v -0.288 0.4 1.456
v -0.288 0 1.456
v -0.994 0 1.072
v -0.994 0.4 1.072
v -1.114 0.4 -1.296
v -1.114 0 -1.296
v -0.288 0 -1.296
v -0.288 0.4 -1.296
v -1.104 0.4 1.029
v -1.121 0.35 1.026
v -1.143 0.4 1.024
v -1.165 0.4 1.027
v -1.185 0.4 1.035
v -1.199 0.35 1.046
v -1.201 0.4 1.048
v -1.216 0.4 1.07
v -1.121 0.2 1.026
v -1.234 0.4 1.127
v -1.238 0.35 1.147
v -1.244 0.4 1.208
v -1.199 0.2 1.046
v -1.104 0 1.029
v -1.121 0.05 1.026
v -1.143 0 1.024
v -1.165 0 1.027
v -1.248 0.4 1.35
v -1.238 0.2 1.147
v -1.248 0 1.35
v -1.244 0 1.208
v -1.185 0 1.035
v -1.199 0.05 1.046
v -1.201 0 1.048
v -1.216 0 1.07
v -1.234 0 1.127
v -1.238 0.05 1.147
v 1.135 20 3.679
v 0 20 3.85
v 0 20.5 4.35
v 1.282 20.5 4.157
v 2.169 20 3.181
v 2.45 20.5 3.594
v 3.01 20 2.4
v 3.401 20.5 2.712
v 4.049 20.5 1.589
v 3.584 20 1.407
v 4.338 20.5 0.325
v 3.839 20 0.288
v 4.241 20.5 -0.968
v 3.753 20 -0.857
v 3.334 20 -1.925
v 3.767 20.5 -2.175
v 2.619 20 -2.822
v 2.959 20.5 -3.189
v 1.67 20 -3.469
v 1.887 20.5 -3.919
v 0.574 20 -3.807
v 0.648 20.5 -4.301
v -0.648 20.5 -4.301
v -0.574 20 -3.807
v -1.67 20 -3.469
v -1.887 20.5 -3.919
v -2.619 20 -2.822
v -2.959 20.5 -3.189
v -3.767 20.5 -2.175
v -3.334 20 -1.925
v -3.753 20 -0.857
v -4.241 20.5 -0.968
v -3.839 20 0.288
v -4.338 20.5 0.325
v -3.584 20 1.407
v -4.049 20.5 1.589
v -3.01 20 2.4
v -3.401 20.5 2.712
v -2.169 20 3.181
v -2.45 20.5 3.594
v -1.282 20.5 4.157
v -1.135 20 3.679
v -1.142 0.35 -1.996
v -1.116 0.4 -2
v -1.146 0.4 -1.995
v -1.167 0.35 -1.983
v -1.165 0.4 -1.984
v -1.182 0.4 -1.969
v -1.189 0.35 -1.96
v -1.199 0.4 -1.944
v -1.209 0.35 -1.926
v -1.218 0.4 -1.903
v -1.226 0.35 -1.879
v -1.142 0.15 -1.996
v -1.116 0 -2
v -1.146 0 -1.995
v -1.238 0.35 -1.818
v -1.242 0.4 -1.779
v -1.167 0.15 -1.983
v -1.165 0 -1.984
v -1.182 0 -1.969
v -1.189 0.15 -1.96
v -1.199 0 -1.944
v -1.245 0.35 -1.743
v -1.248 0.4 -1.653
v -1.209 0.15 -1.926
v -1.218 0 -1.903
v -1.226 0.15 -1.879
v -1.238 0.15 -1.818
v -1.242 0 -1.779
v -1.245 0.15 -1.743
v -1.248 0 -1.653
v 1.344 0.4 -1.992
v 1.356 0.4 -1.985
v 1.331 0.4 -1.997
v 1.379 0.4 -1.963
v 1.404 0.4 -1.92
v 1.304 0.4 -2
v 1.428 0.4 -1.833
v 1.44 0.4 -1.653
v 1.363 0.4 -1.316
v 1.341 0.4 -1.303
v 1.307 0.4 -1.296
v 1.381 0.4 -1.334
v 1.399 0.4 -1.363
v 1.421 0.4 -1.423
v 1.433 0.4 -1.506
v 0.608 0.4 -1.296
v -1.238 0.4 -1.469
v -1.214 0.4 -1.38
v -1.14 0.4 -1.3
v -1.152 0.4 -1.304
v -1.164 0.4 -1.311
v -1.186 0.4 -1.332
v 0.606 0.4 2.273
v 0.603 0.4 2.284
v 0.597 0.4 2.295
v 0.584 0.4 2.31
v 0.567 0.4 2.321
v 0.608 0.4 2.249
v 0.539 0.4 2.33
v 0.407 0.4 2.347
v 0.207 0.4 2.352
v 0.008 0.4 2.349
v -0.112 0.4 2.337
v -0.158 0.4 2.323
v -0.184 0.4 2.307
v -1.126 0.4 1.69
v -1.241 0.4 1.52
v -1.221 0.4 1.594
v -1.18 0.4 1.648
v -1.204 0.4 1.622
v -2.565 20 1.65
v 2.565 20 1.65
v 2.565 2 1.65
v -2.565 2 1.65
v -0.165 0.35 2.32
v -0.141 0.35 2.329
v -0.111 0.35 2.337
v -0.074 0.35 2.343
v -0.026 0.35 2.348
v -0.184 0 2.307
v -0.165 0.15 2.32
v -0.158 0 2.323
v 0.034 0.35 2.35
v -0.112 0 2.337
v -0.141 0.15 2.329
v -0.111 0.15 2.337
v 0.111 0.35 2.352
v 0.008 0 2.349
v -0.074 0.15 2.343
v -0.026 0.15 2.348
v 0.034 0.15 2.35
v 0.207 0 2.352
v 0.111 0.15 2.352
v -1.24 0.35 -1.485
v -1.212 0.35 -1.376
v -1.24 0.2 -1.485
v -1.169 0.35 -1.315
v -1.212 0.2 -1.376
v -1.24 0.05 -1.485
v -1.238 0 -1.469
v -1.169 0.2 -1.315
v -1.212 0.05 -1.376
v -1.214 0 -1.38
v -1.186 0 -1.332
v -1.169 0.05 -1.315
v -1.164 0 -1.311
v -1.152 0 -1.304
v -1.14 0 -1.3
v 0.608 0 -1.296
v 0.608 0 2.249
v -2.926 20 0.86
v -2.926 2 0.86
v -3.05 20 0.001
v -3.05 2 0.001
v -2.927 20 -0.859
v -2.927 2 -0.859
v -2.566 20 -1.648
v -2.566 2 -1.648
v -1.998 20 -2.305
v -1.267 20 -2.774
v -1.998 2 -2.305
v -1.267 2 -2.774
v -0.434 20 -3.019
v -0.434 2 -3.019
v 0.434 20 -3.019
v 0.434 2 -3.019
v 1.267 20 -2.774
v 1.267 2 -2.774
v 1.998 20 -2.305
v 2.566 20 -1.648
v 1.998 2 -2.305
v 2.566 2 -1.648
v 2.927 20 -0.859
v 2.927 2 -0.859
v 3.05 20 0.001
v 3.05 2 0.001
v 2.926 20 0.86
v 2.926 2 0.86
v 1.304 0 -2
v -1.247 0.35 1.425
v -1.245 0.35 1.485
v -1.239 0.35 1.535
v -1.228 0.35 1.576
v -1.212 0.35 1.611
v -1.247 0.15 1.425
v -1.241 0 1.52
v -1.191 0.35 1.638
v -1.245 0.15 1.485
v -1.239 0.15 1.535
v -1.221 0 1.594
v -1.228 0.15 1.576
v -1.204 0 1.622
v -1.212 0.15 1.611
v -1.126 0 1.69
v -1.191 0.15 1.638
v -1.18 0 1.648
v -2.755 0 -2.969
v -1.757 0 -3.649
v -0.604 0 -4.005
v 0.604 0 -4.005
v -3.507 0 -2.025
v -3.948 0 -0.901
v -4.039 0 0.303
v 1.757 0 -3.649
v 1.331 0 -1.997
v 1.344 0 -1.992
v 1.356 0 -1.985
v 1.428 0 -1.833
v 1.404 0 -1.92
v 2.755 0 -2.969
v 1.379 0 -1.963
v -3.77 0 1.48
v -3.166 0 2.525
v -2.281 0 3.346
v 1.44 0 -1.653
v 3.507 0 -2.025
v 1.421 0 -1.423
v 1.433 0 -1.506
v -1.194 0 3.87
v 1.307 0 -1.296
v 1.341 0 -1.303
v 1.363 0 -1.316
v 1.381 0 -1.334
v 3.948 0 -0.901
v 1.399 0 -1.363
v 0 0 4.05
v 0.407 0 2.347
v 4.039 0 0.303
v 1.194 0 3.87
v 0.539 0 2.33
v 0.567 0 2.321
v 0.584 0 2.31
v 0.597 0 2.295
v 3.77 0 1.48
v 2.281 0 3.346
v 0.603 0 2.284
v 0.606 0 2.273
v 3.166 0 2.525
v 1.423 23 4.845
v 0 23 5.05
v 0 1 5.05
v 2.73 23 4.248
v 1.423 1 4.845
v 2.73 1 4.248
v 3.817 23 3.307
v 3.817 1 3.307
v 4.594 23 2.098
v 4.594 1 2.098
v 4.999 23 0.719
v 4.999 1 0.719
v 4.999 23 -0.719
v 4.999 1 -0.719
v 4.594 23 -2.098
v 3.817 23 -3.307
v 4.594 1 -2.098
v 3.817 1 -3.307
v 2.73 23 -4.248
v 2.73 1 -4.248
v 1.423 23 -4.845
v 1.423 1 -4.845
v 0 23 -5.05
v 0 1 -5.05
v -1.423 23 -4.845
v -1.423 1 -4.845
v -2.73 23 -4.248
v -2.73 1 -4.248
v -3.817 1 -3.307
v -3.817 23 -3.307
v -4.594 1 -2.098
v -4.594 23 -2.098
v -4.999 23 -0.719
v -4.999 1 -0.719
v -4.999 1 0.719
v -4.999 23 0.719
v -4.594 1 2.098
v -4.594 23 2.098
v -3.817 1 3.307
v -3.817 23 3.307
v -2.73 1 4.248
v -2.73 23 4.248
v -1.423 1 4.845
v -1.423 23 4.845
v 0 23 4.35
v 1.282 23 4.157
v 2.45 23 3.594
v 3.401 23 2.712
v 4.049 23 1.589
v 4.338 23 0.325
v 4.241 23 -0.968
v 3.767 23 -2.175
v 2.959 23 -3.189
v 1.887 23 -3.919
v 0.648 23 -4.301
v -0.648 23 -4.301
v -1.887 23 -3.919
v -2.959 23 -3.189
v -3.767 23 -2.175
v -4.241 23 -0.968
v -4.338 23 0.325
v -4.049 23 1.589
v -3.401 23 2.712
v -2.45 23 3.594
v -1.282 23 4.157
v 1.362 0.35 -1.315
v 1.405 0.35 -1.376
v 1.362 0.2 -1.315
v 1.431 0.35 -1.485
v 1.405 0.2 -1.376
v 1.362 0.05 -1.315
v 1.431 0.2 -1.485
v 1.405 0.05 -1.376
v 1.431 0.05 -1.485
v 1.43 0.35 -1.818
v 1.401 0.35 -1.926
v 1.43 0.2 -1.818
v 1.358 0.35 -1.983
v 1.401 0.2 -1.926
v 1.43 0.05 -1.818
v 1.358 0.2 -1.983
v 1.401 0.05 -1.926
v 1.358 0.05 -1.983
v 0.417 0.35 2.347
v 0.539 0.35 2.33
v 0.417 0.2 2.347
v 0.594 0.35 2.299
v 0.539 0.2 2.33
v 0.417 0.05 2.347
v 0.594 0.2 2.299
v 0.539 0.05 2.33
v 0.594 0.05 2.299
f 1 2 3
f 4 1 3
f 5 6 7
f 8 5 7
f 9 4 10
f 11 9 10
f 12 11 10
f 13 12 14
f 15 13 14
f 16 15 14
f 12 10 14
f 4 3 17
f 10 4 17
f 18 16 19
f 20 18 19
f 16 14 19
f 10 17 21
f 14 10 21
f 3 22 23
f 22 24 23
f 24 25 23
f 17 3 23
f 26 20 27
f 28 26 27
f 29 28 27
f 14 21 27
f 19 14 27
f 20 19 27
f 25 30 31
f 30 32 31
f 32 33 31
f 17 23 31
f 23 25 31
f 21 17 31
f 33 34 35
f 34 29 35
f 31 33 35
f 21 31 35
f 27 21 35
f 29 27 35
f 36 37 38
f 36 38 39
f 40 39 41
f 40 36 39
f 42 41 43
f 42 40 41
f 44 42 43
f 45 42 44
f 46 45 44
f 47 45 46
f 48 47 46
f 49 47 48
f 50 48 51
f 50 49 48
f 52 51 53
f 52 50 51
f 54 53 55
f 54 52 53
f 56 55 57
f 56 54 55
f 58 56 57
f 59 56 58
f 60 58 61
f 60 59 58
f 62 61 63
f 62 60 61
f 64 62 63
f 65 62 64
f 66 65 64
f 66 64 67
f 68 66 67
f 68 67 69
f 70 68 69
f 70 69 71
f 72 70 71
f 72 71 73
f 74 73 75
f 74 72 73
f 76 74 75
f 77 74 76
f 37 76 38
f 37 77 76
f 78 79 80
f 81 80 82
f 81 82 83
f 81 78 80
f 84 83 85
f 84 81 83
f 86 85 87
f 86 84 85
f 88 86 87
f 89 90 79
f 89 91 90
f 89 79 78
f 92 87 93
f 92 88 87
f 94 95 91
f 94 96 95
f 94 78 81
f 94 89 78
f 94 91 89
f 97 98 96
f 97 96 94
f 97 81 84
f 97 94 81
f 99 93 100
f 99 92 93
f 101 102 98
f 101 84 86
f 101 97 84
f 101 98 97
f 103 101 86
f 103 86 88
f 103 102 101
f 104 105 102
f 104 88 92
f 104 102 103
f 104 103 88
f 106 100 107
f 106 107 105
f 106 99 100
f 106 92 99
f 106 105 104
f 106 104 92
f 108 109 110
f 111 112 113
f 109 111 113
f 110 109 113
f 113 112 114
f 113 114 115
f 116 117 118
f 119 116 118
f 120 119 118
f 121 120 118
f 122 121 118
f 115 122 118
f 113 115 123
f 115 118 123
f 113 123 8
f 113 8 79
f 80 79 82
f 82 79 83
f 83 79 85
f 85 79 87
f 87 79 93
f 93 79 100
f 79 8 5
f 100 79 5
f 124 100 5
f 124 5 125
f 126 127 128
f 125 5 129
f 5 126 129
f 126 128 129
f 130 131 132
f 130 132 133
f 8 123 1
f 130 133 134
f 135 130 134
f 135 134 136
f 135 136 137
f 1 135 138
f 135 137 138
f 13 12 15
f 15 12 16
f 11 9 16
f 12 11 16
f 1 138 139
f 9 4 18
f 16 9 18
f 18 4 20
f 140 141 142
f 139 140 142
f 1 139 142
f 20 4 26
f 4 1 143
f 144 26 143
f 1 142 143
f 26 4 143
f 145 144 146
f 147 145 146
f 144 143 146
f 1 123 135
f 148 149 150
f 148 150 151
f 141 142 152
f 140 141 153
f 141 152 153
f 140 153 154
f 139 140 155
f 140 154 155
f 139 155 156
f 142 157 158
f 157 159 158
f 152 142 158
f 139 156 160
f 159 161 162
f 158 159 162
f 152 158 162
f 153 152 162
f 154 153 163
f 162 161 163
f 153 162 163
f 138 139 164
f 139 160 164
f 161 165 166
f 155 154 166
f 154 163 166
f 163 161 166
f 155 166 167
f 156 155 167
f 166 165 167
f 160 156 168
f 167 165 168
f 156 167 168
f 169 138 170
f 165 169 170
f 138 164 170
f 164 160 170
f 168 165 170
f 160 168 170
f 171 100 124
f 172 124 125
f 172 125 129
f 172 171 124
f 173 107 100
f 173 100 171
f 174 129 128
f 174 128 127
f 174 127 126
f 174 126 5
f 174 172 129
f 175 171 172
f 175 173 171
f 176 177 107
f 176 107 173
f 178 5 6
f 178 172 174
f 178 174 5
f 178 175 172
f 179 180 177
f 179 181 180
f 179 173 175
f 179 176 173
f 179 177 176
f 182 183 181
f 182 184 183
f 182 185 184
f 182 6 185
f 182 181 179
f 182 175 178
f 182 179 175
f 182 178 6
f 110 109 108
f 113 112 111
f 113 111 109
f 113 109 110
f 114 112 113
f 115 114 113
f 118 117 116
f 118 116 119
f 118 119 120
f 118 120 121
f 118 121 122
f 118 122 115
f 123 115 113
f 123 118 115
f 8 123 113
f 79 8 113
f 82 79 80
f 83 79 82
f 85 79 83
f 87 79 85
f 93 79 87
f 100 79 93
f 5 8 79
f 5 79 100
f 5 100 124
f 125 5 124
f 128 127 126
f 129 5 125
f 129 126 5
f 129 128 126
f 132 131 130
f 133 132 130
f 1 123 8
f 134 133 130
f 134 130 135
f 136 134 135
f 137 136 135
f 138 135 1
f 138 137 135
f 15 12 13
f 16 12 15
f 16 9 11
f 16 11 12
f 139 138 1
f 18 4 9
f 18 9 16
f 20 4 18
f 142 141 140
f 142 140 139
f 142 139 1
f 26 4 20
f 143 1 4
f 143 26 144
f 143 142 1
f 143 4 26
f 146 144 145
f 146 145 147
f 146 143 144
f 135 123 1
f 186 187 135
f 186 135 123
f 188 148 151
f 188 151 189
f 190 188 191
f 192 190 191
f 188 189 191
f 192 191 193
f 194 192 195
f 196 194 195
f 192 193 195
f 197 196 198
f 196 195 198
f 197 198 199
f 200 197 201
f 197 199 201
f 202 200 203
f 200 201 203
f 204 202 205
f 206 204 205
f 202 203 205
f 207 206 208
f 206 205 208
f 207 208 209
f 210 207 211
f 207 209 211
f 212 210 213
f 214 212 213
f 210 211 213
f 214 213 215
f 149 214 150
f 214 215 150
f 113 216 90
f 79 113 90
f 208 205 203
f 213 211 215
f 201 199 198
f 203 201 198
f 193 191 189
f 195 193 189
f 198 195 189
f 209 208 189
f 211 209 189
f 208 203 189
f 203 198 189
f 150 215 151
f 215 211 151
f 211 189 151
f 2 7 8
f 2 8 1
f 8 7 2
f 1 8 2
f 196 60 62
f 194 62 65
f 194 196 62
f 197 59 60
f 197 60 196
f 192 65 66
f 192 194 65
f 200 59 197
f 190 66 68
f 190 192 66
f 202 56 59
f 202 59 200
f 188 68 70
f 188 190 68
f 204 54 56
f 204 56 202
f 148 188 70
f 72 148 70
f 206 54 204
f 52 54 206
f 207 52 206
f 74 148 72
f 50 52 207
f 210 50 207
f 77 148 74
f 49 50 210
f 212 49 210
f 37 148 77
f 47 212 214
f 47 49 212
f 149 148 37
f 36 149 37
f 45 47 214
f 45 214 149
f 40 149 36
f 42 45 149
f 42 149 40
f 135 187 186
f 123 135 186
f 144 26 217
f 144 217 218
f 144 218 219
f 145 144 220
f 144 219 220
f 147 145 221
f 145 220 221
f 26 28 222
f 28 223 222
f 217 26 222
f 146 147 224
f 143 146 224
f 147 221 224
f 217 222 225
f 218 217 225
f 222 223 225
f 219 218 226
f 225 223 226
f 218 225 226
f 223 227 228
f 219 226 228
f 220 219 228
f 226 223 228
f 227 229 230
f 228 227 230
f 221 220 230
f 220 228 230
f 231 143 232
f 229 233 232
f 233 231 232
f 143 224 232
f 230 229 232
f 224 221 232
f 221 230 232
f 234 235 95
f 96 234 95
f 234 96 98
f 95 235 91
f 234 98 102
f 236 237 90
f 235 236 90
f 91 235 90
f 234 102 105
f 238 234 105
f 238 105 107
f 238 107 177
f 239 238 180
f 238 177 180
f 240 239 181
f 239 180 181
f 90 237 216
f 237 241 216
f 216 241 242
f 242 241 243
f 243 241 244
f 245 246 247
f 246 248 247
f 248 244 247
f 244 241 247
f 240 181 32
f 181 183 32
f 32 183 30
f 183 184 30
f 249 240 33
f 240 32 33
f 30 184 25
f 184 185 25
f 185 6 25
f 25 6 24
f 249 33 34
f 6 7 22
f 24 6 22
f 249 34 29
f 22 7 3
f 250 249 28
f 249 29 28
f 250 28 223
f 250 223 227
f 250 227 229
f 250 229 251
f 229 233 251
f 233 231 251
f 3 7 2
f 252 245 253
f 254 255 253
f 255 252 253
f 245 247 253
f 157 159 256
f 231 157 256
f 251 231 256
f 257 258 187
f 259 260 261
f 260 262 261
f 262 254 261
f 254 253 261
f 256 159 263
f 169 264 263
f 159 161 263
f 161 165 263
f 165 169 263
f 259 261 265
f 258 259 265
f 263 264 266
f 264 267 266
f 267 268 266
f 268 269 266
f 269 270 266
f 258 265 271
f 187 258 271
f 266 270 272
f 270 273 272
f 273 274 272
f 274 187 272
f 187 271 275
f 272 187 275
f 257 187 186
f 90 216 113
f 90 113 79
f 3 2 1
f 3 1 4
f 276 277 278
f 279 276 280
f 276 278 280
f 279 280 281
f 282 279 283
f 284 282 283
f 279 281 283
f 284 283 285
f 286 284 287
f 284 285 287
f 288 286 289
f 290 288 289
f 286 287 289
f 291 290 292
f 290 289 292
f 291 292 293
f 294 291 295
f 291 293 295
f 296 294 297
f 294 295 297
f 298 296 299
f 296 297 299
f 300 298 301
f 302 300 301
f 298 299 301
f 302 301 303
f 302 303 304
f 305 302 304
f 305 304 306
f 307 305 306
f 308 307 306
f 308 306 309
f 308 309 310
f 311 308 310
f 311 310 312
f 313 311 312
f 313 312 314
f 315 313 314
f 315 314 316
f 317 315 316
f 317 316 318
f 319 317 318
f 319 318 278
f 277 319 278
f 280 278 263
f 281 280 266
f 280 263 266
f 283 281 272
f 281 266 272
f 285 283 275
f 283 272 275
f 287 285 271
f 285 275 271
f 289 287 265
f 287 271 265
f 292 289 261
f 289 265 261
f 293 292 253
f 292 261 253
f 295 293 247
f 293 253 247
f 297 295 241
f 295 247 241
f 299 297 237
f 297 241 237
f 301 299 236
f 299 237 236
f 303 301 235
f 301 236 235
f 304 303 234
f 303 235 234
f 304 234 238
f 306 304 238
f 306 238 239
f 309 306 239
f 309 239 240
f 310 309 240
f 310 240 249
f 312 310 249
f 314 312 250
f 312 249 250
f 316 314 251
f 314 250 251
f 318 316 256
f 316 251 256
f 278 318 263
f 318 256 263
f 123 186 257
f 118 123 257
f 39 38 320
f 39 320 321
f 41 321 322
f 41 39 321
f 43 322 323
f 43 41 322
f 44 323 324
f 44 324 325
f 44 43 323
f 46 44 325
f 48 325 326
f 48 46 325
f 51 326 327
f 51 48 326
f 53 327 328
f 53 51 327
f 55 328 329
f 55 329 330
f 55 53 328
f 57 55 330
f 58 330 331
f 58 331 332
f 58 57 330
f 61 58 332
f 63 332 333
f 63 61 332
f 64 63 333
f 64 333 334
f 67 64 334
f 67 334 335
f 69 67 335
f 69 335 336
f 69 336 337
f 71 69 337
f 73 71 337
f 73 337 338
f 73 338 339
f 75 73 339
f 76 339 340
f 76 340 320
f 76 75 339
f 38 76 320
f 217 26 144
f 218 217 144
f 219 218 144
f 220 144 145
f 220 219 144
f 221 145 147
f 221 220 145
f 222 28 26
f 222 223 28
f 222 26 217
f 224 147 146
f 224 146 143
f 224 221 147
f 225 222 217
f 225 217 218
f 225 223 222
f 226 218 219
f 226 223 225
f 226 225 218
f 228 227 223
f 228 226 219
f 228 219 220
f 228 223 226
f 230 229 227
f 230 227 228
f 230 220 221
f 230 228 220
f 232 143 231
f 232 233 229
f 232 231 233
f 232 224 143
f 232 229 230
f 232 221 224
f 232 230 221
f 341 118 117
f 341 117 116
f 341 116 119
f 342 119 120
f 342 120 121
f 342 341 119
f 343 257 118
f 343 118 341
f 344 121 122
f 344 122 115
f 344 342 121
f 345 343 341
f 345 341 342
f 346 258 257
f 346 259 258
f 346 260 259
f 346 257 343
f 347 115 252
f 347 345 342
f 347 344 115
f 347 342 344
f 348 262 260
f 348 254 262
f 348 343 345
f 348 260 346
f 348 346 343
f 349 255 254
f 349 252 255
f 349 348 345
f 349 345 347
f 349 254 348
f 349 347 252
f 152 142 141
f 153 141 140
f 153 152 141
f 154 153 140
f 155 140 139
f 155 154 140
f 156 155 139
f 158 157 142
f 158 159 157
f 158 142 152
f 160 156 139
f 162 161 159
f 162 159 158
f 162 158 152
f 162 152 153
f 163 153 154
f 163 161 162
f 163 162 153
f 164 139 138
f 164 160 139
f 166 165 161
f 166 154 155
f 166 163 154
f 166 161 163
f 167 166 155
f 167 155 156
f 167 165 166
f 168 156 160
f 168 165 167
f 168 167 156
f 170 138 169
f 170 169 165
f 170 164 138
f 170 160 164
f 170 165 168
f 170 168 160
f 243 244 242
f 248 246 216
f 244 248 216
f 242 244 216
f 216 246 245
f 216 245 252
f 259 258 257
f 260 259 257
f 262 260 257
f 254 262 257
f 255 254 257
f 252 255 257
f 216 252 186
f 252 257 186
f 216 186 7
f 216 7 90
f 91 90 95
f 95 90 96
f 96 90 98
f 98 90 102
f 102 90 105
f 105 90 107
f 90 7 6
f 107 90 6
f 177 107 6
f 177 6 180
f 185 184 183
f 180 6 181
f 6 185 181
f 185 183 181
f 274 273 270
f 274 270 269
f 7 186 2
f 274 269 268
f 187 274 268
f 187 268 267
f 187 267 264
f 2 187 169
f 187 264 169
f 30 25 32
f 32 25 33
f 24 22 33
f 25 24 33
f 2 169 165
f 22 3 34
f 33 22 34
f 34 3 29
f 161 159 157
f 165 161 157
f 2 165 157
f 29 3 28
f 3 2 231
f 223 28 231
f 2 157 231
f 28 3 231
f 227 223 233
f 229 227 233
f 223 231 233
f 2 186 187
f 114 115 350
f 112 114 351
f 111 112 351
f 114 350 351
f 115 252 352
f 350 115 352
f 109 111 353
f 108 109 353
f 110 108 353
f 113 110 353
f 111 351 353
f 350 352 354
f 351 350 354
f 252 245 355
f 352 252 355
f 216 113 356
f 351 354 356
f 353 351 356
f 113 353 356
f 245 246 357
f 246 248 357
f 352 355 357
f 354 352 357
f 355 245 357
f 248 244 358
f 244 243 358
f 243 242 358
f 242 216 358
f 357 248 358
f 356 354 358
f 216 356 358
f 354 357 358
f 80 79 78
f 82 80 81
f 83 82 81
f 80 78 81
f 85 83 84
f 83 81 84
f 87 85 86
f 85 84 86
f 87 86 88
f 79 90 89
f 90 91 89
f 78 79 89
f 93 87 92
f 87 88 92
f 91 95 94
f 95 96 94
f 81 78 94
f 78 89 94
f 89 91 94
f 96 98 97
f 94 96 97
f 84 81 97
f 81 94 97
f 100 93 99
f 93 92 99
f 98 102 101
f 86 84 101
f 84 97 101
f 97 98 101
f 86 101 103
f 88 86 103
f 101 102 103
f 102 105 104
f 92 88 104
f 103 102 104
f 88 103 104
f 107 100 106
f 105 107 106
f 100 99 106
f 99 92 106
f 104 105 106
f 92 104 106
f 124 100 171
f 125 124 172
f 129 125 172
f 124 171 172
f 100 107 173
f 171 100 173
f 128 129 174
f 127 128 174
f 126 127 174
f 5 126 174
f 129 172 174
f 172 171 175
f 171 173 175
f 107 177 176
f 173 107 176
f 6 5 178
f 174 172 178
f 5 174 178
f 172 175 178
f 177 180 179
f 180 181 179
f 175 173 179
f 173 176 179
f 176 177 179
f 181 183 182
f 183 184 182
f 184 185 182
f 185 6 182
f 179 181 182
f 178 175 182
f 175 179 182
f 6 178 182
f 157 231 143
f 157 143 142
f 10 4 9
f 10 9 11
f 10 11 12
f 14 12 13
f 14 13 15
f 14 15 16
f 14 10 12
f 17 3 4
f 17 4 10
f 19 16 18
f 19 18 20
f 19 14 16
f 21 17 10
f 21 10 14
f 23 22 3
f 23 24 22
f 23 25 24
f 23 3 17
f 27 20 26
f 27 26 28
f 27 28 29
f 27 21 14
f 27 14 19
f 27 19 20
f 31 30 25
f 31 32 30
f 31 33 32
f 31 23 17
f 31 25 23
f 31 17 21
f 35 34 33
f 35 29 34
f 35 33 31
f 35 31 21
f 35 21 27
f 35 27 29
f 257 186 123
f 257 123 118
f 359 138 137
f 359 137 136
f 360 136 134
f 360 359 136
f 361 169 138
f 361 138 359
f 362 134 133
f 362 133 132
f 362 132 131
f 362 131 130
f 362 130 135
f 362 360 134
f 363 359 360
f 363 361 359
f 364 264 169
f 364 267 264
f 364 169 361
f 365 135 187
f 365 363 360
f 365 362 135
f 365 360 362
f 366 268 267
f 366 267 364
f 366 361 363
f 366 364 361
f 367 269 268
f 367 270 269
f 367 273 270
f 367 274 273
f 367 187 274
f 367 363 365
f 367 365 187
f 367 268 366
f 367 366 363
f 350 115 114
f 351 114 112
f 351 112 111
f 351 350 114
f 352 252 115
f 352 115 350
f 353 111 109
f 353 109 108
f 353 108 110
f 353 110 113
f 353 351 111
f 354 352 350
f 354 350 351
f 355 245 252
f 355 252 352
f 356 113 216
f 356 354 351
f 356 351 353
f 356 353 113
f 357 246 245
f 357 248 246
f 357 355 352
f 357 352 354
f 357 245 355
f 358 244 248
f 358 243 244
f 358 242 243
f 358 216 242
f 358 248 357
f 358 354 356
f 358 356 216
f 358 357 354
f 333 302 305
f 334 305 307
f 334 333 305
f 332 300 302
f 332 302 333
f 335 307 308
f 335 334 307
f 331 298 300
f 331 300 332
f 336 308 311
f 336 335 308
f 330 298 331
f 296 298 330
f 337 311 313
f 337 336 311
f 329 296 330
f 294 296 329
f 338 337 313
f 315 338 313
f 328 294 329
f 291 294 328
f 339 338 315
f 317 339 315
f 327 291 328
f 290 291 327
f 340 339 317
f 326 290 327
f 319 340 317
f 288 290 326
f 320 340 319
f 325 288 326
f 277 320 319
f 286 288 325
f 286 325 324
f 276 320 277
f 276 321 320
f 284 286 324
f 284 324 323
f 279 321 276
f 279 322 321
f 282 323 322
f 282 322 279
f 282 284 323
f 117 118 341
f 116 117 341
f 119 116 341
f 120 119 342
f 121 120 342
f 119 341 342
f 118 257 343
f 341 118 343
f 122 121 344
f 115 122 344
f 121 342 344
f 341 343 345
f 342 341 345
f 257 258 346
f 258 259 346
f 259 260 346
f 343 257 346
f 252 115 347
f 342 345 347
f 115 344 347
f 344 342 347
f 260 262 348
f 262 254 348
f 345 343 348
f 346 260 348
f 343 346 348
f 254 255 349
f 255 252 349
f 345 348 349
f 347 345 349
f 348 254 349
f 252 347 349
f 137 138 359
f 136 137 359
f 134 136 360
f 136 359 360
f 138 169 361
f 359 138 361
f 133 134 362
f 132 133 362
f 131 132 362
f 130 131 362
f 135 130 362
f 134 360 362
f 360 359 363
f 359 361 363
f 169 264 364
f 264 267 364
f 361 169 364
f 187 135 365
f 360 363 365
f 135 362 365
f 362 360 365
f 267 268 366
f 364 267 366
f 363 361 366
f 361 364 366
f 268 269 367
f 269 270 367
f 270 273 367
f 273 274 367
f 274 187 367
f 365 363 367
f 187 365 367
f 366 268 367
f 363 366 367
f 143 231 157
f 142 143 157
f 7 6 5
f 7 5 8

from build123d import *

# Parameters (mm, degrees)
SKETCH1_R           = 5.05
BOSS_EXTRUDE1_DEPTH = 20
SKETCH2_R           = 5.05
BOSS_EXTRUDE2_DEPTH = 2
SKETCH4_R           = 5.05
SKETCH4_R_2         = 4.35
BOSS_EXTRUDE3_DEPTH = 3
CHAMFER1_SIZE       = 1
CHAMFER2_SIZE       = 0.5
CUT_EXTRUDE1_DEPTH  = 0.4
BOSS_EXTRUDE4_DEPTH = 0.4


with BuildPart() as part:
    # Sketch1 → Boss-Extrude1 (new body)
    with BuildSketch(Plane(origin=(0, 0, 0), x_dir=(1, 0, 0), z_dir=(0, 1, 0))):
        Circle(SKETCH1_R)
        with BuildLine():
            Line((2.565151068, -1.65), (-2.565151068, -1.65))
            ThreePointArc((-2.565151068, -1.65), (0, 3.05), (2.565151068, -1.65))
        make_face(mode=Mode.SUBTRACT)
    extrude(amount=BOSS_EXTRUDE1_DEPTH)

    # Sketch2 → Boss-Extrude2 (add)
    with BuildSketch(Plane.XZ):
        Circle(SKETCH2_R)
    extrude(amount=-BOSS_EXTRUDE2_DEPTH)

    # Sketch4 → Boss-Extrude3 (add)
    with BuildSketch(Plane(origin=(0, 20, 0), x_dir=(1, 0, 0), z_dir=(0, 1, 0))):
        Circle(SKETCH4_R)
        Circle(SKETCH4_R_2, mode=Mode.SUBTRACT)
    extrude(amount=BOSS_EXTRUDE3_DEPTH)

    # Chamfer1
    chamfer1_edges = [part.edges().sort_by_distance(p)[0] for p in [
        (-5.05, 0, 0),
    ]]
    chamfer(chamfer1_edges, length=CHAMFER1_SIZE)

    # Chamfer2
    chamfer2_edges = [part.edges().sort_by_distance(p)[0] for p in [
        (-4.35, 20, 0),
    ]]
    chamfer(chamfer2_edges, length=CHAMFER2_SIZE)

    # Sketch5 → Cut-Extrude1 (cut)
    with BuildSketch(Plane.XZ):
        with BuildLine():
            add(Edge.make_bspline(
                [(1.439948587, -1.653012389), (1.439876699, -1.683045128), (1.43974458, -1.738240911), (1.431271471, -1.813705895), (1.420527775, -1.875466606), (1.403574072, -1.923288418), (1.383622282, -1.959101708), (1.360105213, -1.983267515), (1.333129744, -1.998183394), (1.313801842, -1.999386809), (1.303953443, -2)],
                knots=[0, 0, 0, 0, 1.769380938, 3.251863504, 4.473793643, 5.456147252, 6.231459106, 6.87077347, 7.424610359, 8, 8, 8, 8], degree=3))
            Line((1.303953443, -2), (-1.115960155, -2))
            add(Edge.make_bspline(
                [(-1.115960155, -2), (-1.124764856, -1.999235199), (-1.143000862, -1.997651168), (-1.169069324, -1.98355213), (-1.191525204, -1.958680582), (-1.211674261, -1.923370629), (-1.22844035, -1.875430661), (-1.2396129, -1.81377917), (-1.2461065, -1.738146636), (-1.247303601, -1.683026326), (-1.247955442, -1.653012389)],
                knots=[0, 0, 0, 0, 0.521835169, 1.080807807, 1.712179375, 2.494680724, 3.486143732, 4.719404872, 6.213660719, 8, 8, 8, 8], degree=3))
            add(Edge.make_bspline(
                [(-1.247955442, -1.653012389), (-1.247564606, -1.622348678), (-1.246849977, -1.56628126), (-1.242082904, -1.489472136), (-1.229908593, -1.427530805), (-1.214570878, -1.378346332), (-1.19448558, -1.341252685), (-1.171381331, -1.314540094), (-1.143493064, -1.299098496), (-1.123793171, -1.297048409), (-1.113960226, -1.296025135)],
                knots=[0, 0, 0, 0, 1.773338699, 3.242481697, 4.440534656, 5.415572, 6.2091949, 6.863837362, 7.432899261, 8, 8, 8, 8], degree=3))
            Line((-1.113960226, -1.296025135), (-0.287989717, -1.296025135))
            Line((-0.287989717, -1.296025135), (-0.287989717, 1.455876608))
            Line((-0.287989717, 1.455876608), (-0.993964511, 1.071890319))
            add(Edge.make_bspline(
                [(-0.993964511, 1.071890319), (-1.017440507, 1.061445685), (-1.058655219, 1.043108974), (-1.115600787, 1.024261243), (-1.164016876, 1.022727864), (-1.204048063, 1.044740206), (-1.227168973, 1.090535397), (-1.241056947, 1.154646882), (-1.245930838, 1.243521995), (-1.247219803, 1.311235138), (-1.247955442, 1.349880393)],
                knots=[0, 0, 0, 0, 1.16110972, 2.038456742, 2.701448753, 3.288176025, 3.990880841, 4.937165991, 6.251978929, 8, 8, 8, 8], degree=3))
            add(Edge.make_bspline(
                [(-1.247955442, 1.349880393), (-1.247653425, 1.374880402), (-1.247109683, 1.419889746), (-1.245945241, 1.481671813), (-1.240636397, 1.532510166), (-1.22932079, 1.574897869), (-1.214108207, 1.610487858), (-1.190963524, 1.639477582), (-1.161196377, 1.665121533), (-1.138457223, 1.681091287), (-1.125959798, 1.689868254)],
                knots=[0, 0, 0, 0, 1.56313437, 2.814225196, 3.86369772, 4.748352527, 5.550351806, 6.263187403, 7.045448883, 8, 8, 8, 8], degree=3))
            Line((-1.125959798, 1.689868254), (-0.183993431, 2.306846225))
            add(Edge.make_bspline(
                [(-0.183993431, 2.306846225), (-0.177863774, 2.311559679), (-0.16490946, 2.321521017), (-0.139222649, 2.329492175), (-0.109092066, 2.338056382), (-0.070433284, 2.34348131), (-0.022153707, 2.34904437), (0.039686671, 2.349651098), (0.117302801, 2.352623049), (0.17498744, 2.352122396), (0.206992609, 2.351844618)],
                knots=[0, 0, 0, 0, 0.462162572, 0.976726718, 1.600024173, 2.352504238, 3.321320859, 4.526493399, 6.072794308, 8, 8, 8, 8], degree=3))
            add(Edge.make_bspline(
                [(0.206992609, 2.351844618), (0.246335885, 2.351808308), (0.316381456, 2.351743662), (0.410069056, 2.347873639), (0.481820359, 2.341824657), (0.534201311, 2.331725803), (0.572123093, 2.320729809), (0.59477989, 2.300462138), (0.607217242, 2.276119035), (0.607713437, 2.258338867), (0.607978292, 2.248848296)],
                knots=[0, 0, 0, 0, 2.095956985, 3.731578029, 4.998773625, 5.921870021, 6.585026704, 7.062945429, 7.499825718, 8, 8, 8, 8], degree=3))
            Line((0.607978292, 2.248848296), (0.607978292, -1.296025135))
            Line((0.607978292, -1.296025135), (1.306953335, -1.296025135))
            add(Edge.make_bspline(
                [(1.306953335, -1.296025135), (1.316786669, -1.297048343), (1.336487341, -1.299098296), (1.364369456, -1.314540952), (1.387502528, -1.341248585), (1.407443488, -1.378367057), (1.42348129, -1.427311655), (1.431911749, -1.489804249), (1.43957322, -1.566161665), (1.43981592, -1.622316445), (1.439948587, -1.653012389)],
                knots=[0, 0, 0, 0, 0.567469369, 1.136901174, 1.79196917, 2.586107946, 3.56177909, 4.753767401, 6.225508585, 8, 8, 8, 8], degree=3))
        make_face()
    extrude(amount=-CUT_EXTRUDE1_DEPTH, mode=Mode.SUBTRACT)


with BuildPart() as body_2:
    # Sketch5<2> → Boss-Extrude4 (new body)
    with BuildSketch(Plane.XZ):
        with BuildLine():
            add(Edge.make_bspline(
                [(1.439948587, -1.653012389), (1.439876699, -1.683045128), (1.43974458, -1.738240911), (1.431271471, -1.813705895), (1.420527775, -1.875466606), (1.403574072, -1.923288418), (1.383622282, -1.959101708), (1.360105213, -1.983267515), (1.333129744, -1.998183394), (1.313801842, -1.999386809), (1.303953443, -2)],
                knots=[0, 0, 0, 0, 1.769380938, 3.251863504, 4.473793643, 5.456147252, 6.231459106, 6.87077347, 7.424610359, 8, 8, 8, 8], degree=3))
            Line((1.303953443, -2), (-1.115960155, -2))
            add(Edge.make_bspline(
                [(-1.115960155, -2), (-1.124764856, -1.999235199), (-1.143000862, -1.997651168), (-1.169069324, -1.98355213), (-1.191525204, -1.958680582), (-1.211674261, -1.923370629), (-1.22844035, -1.875430661), (-1.2396129, -1.81377917), (-1.2461065, -1.738146636), (-1.247303601, -1.683026326), (-1.247955442, -1.653012389)],
                knots=[0, 0, 0, 0, 0.521835169, 1.080807807, 1.712179375, 2.494680724, 3.486143732, 4.719404872, 6.213660719, 8, 8, 8, 8], degree=3))
            add(Edge.make_bspline(
                [(-1.247955442, -1.653012389), (-1.247564606, -1.622348678), (-1.246849977, -1.56628126), (-1.242082904, -1.489472136), (-1.229908593, -1.427530805), (-1.214570878, -1.378346332), (-1.19448558, -1.341252685), (-1.171381331, -1.314540094), (-1.143493064, -1.299098496), (-1.123793171, -1.297048409), (-1.113960226, -1.296025135)],
                knots=[0, 0, 0, 0, 1.773338699, 3.242481697, 4.440534656, 5.415572, 6.2091949, 6.863837362, 7.432899261, 8, 8, 8, 8], degree=3))
            Line((-1.113960226, -1.296025135), (-0.287989717, -1.296025135))
            Line((-0.287989717, -1.296025135), (-0.287989717, 1.455876608))
            Line((-0.287989717, 1.455876608), (-0.993964511, 1.071890319))
            add(Edge.make_bspline(
                [(-0.993964511, 1.071890319), (-1.017440507, 1.061445685), (-1.058655219, 1.043108974), (-1.115600787, 1.024261243), (-1.164016876, 1.022727864), (-1.204048063, 1.044740206), (-1.227168973, 1.090535397), (-1.241056947, 1.154646882), (-1.245930838, 1.243521995), (-1.247219803, 1.311235138), (-1.247955442, 1.349880393)],
                knots=[0, 0, 0, 0, 1.16110972, 2.038456742, 2.701448753, 3.288176025, 3.990880841, 4.937165991, 6.251978929, 8, 8, 8, 8], degree=3))
            add(Edge.make_bspline(
                [(-1.247955442, 1.349880393), (-1.247653425, 1.374880402), (-1.247109683, 1.419889746), (-1.245945241, 1.481671813), (-1.240636397, 1.532510166), (-1.22932079, 1.574897869), (-1.214108207, 1.610487858), (-1.190963524, 1.639477582), (-1.161196377, 1.665121533), (-1.138457223, 1.681091287), (-1.125959798, 1.689868254)],
                knots=[0, 0, 0, 0, 1.56313437, 2.814225196, 3.86369772, 4.748352527, 5.550351806, 6.263187403, 7.045448883, 8, 8, 8, 8], degree=3))
            Line((-1.125959798, 1.689868254), (-0.183993431, 2.306846225))
            add(Edge.make_bspline(
                [(-0.183993431, 2.306846225), (-0.177863774, 2.311559679), (-0.16490946, 2.321521017), (-0.139222649, 2.329492175), (-0.109092066, 2.338056382), (-0.070433284, 2.34348131), (-0.022153707, 2.34904437), (0.039686671, 2.349651098), (0.117302801, 2.352623049), (0.17498744, 2.352122396), (0.206992609, 2.351844618)],
                knots=[0, 0, 0, 0, 0.462162572, 0.976726718, 1.600024173, 2.352504238, 3.321320859, 4.526493399, 6.072794308, 8, 8, 8, 8], degree=3))
            add(Edge.make_bspline(
                [(0.206992609, 2.351844618), (0.246335885, 2.351808308), (0.316381456, 2.351743662), (0.410069056, 2.347873639), (0.481820359, 2.341824657), (0.534201311, 2.331725803), (0.572123093, 2.320729809), (0.59477989, 2.300462138), (0.607217242, 2.276119035), (0.607713437, 2.258338867), (0.607978292, 2.248848296)],
                knots=[0, 0, 0, 0, 2.095956985, 3.731578029, 4.998773625, 5.921870021, 6.585026704, 7.062945429, 7.499825718, 8, 8, 8, 8], degree=3))
            Line((0.607978292, 2.248848296), (0.607978292, -1.296025135))
            Line((0.607978292, -1.296025135), (1.306953335, -1.296025135))
            add(Edge.make_bspline(
                [(1.306953335, -1.296025135), (1.316786669, -1.297048343), (1.336487341, -1.299098296), (1.364369456, -1.314540952), (1.387502528, -1.341248585), (1.407443488, -1.378367057), (1.42348129, -1.427311655), (1.431911749, -1.489804249), (1.43957322, -1.566161665), (1.43981592, -1.622316445), (1.439948587, -1.653012389)],
                knots=[0, 0, 0, 0, 0.567469369, 1.136901174, 1.79196917, 2.586107946, 3.56177909, 4.753767401, 6.225508585, 8, 8, 8, 8], degree=3))
        make_face()
    extrude(amount=-BOSS_EXTRUDE4_DEPTH)


solid = Compound([part.part, body_2.part])
